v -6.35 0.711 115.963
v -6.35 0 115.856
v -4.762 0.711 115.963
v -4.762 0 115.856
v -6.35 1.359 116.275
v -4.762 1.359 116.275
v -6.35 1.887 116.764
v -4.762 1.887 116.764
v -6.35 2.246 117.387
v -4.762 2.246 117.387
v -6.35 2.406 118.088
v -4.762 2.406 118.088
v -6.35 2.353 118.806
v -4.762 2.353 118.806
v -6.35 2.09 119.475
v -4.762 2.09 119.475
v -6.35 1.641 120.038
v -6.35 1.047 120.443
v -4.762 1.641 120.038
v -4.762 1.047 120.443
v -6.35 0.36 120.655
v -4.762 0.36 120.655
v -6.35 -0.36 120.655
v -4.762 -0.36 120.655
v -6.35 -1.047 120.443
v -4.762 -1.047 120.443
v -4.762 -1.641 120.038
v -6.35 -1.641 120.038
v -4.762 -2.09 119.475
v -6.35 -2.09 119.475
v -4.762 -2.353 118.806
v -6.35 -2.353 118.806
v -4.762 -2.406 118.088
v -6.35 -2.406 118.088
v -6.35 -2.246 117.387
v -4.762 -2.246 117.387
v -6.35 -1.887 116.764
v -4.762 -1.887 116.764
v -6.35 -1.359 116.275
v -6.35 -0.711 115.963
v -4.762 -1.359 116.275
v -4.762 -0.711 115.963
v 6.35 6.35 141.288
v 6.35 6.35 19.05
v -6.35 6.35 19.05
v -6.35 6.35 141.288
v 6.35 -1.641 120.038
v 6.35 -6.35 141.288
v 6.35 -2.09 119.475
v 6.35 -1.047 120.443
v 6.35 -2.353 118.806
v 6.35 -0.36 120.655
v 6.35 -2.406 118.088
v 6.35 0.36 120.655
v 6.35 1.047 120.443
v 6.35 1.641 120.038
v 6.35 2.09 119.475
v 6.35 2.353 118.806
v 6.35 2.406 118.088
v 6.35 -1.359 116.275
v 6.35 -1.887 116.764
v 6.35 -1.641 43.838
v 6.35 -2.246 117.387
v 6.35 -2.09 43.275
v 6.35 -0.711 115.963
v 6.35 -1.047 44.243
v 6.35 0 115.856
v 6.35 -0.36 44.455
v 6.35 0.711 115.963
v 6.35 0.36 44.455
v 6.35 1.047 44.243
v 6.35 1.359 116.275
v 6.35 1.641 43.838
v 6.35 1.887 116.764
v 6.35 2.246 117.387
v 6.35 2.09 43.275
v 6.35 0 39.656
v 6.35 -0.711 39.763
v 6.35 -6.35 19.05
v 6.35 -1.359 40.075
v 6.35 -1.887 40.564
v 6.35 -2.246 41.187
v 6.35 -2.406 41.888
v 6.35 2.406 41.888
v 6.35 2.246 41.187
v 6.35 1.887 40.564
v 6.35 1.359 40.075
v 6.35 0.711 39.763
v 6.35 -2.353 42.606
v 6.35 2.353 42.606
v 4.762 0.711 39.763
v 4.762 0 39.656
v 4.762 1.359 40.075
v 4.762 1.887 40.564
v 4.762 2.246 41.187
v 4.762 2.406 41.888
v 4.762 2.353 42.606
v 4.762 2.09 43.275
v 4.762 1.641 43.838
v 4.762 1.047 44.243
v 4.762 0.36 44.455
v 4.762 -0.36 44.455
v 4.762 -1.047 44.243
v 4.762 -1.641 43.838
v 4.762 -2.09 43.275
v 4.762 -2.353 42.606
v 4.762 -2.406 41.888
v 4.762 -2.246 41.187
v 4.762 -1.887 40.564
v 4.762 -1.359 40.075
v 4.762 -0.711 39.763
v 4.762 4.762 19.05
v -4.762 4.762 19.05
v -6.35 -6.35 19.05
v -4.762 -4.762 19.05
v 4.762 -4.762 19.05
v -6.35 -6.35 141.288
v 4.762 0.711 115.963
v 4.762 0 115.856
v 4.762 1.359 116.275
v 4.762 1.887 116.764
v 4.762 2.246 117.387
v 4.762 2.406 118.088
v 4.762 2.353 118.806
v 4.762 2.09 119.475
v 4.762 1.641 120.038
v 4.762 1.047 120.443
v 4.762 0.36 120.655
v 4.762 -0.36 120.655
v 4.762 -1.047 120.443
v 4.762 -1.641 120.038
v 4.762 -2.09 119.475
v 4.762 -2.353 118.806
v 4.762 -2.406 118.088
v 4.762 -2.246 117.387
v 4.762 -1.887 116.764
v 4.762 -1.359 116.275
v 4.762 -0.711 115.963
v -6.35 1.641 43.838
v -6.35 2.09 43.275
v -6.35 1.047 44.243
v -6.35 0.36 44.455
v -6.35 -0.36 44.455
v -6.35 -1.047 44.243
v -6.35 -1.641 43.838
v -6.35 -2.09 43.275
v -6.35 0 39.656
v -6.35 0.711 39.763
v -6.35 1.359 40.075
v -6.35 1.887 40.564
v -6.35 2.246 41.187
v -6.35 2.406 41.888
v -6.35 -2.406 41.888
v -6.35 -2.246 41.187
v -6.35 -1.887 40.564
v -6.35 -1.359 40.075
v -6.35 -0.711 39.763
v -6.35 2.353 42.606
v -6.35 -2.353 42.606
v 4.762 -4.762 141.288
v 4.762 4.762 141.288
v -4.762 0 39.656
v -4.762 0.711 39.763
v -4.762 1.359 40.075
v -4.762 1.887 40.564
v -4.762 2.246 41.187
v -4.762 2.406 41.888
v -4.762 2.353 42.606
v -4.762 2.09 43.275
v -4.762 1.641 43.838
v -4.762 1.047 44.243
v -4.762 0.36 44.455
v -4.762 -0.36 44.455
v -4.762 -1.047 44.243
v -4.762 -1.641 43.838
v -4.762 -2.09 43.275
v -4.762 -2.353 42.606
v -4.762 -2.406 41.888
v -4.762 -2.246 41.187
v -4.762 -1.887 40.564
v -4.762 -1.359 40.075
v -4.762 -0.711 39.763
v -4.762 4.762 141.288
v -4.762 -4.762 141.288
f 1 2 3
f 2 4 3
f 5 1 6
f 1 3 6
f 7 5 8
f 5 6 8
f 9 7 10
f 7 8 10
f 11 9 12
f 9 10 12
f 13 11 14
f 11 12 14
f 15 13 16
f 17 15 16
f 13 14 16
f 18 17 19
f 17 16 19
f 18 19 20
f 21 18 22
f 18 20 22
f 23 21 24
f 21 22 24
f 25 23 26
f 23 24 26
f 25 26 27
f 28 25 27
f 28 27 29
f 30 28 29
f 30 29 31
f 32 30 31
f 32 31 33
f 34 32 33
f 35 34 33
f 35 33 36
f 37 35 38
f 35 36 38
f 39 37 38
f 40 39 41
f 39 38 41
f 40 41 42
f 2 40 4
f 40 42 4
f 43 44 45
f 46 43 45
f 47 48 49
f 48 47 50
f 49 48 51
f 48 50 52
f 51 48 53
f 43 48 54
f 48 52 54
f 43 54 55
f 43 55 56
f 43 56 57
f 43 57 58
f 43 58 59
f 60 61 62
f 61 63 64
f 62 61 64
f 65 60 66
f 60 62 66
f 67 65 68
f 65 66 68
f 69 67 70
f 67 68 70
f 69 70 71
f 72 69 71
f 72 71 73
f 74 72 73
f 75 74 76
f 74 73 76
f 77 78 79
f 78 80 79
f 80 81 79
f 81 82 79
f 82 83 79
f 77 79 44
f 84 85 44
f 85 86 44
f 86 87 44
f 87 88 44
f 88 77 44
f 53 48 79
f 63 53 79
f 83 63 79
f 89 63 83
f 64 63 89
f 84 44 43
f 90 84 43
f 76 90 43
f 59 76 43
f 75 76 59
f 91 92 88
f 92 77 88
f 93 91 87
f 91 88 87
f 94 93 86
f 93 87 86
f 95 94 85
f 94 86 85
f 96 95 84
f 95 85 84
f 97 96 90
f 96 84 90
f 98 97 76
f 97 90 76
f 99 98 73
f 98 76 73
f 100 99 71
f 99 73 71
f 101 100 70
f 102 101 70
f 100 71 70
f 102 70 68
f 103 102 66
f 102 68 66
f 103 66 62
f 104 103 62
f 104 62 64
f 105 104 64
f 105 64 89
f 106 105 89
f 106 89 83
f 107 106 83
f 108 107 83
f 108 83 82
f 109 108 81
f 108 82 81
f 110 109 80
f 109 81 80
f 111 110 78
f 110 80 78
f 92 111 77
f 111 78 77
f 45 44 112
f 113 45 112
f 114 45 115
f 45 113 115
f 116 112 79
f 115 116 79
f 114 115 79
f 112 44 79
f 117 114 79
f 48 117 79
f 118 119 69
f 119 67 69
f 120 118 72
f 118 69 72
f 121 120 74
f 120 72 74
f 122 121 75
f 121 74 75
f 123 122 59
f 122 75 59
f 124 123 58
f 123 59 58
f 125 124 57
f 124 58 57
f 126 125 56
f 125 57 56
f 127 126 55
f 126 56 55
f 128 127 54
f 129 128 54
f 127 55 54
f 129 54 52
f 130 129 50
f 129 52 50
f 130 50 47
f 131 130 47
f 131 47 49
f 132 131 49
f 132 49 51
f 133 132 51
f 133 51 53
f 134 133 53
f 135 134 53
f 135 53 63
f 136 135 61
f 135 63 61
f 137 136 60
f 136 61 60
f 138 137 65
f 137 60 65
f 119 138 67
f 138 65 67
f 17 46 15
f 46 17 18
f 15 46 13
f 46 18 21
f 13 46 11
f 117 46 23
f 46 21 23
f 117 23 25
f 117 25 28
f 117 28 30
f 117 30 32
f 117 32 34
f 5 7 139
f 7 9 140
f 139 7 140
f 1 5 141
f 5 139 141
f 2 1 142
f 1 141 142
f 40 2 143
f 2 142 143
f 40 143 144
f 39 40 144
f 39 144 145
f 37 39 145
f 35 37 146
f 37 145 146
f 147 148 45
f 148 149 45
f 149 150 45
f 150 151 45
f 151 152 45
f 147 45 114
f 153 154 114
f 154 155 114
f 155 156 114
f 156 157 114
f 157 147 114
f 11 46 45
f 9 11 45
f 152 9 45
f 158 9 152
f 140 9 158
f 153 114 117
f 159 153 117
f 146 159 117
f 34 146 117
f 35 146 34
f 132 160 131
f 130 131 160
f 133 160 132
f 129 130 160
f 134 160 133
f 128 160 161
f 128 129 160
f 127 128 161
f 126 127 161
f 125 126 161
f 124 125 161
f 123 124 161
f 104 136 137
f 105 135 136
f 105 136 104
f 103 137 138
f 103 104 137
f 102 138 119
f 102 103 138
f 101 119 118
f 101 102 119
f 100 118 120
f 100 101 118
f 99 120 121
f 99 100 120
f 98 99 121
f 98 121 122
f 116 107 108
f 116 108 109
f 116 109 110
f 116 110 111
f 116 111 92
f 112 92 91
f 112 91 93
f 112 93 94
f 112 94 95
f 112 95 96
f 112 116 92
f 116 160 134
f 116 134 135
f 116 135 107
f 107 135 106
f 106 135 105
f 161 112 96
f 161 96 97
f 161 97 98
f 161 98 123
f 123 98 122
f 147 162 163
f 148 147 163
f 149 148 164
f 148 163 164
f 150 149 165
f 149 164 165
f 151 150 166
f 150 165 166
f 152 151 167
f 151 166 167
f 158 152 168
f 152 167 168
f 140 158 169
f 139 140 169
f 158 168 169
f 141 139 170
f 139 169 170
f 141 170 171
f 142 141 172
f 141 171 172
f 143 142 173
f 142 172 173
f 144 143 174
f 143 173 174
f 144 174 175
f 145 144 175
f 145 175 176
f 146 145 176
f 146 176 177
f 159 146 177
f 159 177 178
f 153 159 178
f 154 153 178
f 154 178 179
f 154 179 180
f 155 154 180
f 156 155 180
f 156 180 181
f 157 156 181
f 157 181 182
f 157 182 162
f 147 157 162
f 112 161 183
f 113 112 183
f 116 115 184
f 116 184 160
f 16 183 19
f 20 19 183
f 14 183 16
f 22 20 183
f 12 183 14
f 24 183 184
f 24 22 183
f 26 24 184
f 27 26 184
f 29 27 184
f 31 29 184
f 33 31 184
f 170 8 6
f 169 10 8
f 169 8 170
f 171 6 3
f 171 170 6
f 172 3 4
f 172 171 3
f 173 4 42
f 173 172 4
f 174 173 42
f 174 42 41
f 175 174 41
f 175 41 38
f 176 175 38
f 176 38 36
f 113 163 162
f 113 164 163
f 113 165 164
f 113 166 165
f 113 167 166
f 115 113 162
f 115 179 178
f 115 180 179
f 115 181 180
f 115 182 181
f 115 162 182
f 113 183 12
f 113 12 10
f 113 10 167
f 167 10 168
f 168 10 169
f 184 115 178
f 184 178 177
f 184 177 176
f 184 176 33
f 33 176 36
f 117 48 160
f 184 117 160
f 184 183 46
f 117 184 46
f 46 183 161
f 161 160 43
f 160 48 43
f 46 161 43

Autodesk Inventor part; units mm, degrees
ref_plane "YZ Plane" through (0, 0, 0) normal (1, 0, 0) x (0, 1, 0)
ref_plane "XZ Plane" through (0, 0, 0) normal (0, 1, 0) x (-1, 0, 0)
ref_plane "XY Plane" through (0, 0, 0) normal (0, 0, 1) x (1, 0, 0)
sketch "Sketch1" plane through (0, 0, 0) normal (0, 0, 1) x (1, 0, 0)
  line L0 (-6.35, -6.35) -> (6.35, -6.35)
  line L1 (6.35, -6.35) -> (6.35, 6.35)
  line L2 (6.35, 6.35) -> (-6.35, 6.35)
  line L3 (-6.35, 6.35) -> (-6.35, -6.35)
  line L4 (-6.35, -6.35) -> (6.35, 6.35) construction
  line L5 (6.35, -6.35) -> (-6.35, 6.35) construction
  line L6 (-4.7625, -4.7625) -> (4.7625, -4.7625)
  line L7 (4.7625, -4.7625) -> (4.7625, 4.7625)
  line L8 (4.7625, 4.7625) -> (-4.7625, 4.7625)
  line L9 (-4.7625, 4.7625) -> (-4.7625, -4.7625)
  line L10 (-4.7625, -4.7625) -> (4.7625, 4.7625) construction
  line L11 (4.7625, -4.7625) -> (-4.7625, 4.7625) construction
  point P0 (0, 0)
  dimension "d0" = 12.7
  dimension "d1" = 12.7
  dimension "d2" = 9.525
  dimension "d3" = 9.525
extrude "Extrusion1" add sketch "Sketch1" along normal blind 160.3375
sketch "Sketch2" plane through (6.35, -6.35, 0) normal (1, 0, 0) x (0, 0, -1)
  circle A0 centre (-118.2688, 6.35) radius 2.413
  circle A1 centre (-42.0688, 6.35) radius 2.413
  line L0 (0, 0) -> (0, 12.7) projected
  line L1 (-160.3375, 0) -> (-160.3375, 12.7) projected
  line L2 (0, 0) -> (-160.3375, 0) projected
  line L3 (-118.2688, 6.35) -> (-42.0688, 6.35)
  line L4 (-118.2688, 6.35) -> (-160.3375, 6.35)
  line L5 (-42.0688, 6.35) -> (0, 6.35)
  dimension "d6" = 4.826
  dimension "d7" = 4.826
  dimension "d10" = 76.2
extrude "Extrusion2" cut sketch "Sketch2" against normal blind 160.3375 contours L3 L4 A0 | A0 L4 L3 | L3 L5 A1 | A1 L5 L3
sketch "Sketch3" plane through (6.35, -6.35, 0) normal (1, 0, 0) x (0, 0, -1)
  line L0 (-160.3375, 0) -> (-160.3375, 12.7) projected
  line L1 (-179.3875, -12.1882) -> (-141.2875, -12.1882)
  line L2 (-141.2875, -12.1882) -> (-141.2875, 24.8882)
  line L3 (-141.2875, 24.8882) -> (-179.3875, 24.8882)
  line L4 (-179.3875, 24.8882) -> (-179.3875, -12.1882)
  line L5 (-179.3875, -12.1882) -> (-141.2875, 24.8882) construction
  line L6 (-141.2875, -12.1882) -> (-179.3875, 24.8882) construction
  line L7 (-19.05, -6.325) -> (19.05, -6.325)
  line L8 (19.05, -6.325) -> (19.05, 19.025)
  line L9 (19.05, 19.025) -> (-19.05, 19.025)
  line L10 (-19.05, 19.025) -> (-19.05, -6.325)
  line L11 (-19.05, -6.325) -> (19.05, 19.025) construction
  line L12 (19.05, -6.325) -> (-19.05, 19.025) construction
  point P0 (0, 6.35)
  point P1 (-160.3375, 6.35)
  dimension "d11" = 38.1
  dimension "d12" = 38.1
extrude "Extrusion3" cut sketch "Sketch3" against normal blind 160.3375
properties part number "box alluminum custom 6in" material "Aluminum 6061"
